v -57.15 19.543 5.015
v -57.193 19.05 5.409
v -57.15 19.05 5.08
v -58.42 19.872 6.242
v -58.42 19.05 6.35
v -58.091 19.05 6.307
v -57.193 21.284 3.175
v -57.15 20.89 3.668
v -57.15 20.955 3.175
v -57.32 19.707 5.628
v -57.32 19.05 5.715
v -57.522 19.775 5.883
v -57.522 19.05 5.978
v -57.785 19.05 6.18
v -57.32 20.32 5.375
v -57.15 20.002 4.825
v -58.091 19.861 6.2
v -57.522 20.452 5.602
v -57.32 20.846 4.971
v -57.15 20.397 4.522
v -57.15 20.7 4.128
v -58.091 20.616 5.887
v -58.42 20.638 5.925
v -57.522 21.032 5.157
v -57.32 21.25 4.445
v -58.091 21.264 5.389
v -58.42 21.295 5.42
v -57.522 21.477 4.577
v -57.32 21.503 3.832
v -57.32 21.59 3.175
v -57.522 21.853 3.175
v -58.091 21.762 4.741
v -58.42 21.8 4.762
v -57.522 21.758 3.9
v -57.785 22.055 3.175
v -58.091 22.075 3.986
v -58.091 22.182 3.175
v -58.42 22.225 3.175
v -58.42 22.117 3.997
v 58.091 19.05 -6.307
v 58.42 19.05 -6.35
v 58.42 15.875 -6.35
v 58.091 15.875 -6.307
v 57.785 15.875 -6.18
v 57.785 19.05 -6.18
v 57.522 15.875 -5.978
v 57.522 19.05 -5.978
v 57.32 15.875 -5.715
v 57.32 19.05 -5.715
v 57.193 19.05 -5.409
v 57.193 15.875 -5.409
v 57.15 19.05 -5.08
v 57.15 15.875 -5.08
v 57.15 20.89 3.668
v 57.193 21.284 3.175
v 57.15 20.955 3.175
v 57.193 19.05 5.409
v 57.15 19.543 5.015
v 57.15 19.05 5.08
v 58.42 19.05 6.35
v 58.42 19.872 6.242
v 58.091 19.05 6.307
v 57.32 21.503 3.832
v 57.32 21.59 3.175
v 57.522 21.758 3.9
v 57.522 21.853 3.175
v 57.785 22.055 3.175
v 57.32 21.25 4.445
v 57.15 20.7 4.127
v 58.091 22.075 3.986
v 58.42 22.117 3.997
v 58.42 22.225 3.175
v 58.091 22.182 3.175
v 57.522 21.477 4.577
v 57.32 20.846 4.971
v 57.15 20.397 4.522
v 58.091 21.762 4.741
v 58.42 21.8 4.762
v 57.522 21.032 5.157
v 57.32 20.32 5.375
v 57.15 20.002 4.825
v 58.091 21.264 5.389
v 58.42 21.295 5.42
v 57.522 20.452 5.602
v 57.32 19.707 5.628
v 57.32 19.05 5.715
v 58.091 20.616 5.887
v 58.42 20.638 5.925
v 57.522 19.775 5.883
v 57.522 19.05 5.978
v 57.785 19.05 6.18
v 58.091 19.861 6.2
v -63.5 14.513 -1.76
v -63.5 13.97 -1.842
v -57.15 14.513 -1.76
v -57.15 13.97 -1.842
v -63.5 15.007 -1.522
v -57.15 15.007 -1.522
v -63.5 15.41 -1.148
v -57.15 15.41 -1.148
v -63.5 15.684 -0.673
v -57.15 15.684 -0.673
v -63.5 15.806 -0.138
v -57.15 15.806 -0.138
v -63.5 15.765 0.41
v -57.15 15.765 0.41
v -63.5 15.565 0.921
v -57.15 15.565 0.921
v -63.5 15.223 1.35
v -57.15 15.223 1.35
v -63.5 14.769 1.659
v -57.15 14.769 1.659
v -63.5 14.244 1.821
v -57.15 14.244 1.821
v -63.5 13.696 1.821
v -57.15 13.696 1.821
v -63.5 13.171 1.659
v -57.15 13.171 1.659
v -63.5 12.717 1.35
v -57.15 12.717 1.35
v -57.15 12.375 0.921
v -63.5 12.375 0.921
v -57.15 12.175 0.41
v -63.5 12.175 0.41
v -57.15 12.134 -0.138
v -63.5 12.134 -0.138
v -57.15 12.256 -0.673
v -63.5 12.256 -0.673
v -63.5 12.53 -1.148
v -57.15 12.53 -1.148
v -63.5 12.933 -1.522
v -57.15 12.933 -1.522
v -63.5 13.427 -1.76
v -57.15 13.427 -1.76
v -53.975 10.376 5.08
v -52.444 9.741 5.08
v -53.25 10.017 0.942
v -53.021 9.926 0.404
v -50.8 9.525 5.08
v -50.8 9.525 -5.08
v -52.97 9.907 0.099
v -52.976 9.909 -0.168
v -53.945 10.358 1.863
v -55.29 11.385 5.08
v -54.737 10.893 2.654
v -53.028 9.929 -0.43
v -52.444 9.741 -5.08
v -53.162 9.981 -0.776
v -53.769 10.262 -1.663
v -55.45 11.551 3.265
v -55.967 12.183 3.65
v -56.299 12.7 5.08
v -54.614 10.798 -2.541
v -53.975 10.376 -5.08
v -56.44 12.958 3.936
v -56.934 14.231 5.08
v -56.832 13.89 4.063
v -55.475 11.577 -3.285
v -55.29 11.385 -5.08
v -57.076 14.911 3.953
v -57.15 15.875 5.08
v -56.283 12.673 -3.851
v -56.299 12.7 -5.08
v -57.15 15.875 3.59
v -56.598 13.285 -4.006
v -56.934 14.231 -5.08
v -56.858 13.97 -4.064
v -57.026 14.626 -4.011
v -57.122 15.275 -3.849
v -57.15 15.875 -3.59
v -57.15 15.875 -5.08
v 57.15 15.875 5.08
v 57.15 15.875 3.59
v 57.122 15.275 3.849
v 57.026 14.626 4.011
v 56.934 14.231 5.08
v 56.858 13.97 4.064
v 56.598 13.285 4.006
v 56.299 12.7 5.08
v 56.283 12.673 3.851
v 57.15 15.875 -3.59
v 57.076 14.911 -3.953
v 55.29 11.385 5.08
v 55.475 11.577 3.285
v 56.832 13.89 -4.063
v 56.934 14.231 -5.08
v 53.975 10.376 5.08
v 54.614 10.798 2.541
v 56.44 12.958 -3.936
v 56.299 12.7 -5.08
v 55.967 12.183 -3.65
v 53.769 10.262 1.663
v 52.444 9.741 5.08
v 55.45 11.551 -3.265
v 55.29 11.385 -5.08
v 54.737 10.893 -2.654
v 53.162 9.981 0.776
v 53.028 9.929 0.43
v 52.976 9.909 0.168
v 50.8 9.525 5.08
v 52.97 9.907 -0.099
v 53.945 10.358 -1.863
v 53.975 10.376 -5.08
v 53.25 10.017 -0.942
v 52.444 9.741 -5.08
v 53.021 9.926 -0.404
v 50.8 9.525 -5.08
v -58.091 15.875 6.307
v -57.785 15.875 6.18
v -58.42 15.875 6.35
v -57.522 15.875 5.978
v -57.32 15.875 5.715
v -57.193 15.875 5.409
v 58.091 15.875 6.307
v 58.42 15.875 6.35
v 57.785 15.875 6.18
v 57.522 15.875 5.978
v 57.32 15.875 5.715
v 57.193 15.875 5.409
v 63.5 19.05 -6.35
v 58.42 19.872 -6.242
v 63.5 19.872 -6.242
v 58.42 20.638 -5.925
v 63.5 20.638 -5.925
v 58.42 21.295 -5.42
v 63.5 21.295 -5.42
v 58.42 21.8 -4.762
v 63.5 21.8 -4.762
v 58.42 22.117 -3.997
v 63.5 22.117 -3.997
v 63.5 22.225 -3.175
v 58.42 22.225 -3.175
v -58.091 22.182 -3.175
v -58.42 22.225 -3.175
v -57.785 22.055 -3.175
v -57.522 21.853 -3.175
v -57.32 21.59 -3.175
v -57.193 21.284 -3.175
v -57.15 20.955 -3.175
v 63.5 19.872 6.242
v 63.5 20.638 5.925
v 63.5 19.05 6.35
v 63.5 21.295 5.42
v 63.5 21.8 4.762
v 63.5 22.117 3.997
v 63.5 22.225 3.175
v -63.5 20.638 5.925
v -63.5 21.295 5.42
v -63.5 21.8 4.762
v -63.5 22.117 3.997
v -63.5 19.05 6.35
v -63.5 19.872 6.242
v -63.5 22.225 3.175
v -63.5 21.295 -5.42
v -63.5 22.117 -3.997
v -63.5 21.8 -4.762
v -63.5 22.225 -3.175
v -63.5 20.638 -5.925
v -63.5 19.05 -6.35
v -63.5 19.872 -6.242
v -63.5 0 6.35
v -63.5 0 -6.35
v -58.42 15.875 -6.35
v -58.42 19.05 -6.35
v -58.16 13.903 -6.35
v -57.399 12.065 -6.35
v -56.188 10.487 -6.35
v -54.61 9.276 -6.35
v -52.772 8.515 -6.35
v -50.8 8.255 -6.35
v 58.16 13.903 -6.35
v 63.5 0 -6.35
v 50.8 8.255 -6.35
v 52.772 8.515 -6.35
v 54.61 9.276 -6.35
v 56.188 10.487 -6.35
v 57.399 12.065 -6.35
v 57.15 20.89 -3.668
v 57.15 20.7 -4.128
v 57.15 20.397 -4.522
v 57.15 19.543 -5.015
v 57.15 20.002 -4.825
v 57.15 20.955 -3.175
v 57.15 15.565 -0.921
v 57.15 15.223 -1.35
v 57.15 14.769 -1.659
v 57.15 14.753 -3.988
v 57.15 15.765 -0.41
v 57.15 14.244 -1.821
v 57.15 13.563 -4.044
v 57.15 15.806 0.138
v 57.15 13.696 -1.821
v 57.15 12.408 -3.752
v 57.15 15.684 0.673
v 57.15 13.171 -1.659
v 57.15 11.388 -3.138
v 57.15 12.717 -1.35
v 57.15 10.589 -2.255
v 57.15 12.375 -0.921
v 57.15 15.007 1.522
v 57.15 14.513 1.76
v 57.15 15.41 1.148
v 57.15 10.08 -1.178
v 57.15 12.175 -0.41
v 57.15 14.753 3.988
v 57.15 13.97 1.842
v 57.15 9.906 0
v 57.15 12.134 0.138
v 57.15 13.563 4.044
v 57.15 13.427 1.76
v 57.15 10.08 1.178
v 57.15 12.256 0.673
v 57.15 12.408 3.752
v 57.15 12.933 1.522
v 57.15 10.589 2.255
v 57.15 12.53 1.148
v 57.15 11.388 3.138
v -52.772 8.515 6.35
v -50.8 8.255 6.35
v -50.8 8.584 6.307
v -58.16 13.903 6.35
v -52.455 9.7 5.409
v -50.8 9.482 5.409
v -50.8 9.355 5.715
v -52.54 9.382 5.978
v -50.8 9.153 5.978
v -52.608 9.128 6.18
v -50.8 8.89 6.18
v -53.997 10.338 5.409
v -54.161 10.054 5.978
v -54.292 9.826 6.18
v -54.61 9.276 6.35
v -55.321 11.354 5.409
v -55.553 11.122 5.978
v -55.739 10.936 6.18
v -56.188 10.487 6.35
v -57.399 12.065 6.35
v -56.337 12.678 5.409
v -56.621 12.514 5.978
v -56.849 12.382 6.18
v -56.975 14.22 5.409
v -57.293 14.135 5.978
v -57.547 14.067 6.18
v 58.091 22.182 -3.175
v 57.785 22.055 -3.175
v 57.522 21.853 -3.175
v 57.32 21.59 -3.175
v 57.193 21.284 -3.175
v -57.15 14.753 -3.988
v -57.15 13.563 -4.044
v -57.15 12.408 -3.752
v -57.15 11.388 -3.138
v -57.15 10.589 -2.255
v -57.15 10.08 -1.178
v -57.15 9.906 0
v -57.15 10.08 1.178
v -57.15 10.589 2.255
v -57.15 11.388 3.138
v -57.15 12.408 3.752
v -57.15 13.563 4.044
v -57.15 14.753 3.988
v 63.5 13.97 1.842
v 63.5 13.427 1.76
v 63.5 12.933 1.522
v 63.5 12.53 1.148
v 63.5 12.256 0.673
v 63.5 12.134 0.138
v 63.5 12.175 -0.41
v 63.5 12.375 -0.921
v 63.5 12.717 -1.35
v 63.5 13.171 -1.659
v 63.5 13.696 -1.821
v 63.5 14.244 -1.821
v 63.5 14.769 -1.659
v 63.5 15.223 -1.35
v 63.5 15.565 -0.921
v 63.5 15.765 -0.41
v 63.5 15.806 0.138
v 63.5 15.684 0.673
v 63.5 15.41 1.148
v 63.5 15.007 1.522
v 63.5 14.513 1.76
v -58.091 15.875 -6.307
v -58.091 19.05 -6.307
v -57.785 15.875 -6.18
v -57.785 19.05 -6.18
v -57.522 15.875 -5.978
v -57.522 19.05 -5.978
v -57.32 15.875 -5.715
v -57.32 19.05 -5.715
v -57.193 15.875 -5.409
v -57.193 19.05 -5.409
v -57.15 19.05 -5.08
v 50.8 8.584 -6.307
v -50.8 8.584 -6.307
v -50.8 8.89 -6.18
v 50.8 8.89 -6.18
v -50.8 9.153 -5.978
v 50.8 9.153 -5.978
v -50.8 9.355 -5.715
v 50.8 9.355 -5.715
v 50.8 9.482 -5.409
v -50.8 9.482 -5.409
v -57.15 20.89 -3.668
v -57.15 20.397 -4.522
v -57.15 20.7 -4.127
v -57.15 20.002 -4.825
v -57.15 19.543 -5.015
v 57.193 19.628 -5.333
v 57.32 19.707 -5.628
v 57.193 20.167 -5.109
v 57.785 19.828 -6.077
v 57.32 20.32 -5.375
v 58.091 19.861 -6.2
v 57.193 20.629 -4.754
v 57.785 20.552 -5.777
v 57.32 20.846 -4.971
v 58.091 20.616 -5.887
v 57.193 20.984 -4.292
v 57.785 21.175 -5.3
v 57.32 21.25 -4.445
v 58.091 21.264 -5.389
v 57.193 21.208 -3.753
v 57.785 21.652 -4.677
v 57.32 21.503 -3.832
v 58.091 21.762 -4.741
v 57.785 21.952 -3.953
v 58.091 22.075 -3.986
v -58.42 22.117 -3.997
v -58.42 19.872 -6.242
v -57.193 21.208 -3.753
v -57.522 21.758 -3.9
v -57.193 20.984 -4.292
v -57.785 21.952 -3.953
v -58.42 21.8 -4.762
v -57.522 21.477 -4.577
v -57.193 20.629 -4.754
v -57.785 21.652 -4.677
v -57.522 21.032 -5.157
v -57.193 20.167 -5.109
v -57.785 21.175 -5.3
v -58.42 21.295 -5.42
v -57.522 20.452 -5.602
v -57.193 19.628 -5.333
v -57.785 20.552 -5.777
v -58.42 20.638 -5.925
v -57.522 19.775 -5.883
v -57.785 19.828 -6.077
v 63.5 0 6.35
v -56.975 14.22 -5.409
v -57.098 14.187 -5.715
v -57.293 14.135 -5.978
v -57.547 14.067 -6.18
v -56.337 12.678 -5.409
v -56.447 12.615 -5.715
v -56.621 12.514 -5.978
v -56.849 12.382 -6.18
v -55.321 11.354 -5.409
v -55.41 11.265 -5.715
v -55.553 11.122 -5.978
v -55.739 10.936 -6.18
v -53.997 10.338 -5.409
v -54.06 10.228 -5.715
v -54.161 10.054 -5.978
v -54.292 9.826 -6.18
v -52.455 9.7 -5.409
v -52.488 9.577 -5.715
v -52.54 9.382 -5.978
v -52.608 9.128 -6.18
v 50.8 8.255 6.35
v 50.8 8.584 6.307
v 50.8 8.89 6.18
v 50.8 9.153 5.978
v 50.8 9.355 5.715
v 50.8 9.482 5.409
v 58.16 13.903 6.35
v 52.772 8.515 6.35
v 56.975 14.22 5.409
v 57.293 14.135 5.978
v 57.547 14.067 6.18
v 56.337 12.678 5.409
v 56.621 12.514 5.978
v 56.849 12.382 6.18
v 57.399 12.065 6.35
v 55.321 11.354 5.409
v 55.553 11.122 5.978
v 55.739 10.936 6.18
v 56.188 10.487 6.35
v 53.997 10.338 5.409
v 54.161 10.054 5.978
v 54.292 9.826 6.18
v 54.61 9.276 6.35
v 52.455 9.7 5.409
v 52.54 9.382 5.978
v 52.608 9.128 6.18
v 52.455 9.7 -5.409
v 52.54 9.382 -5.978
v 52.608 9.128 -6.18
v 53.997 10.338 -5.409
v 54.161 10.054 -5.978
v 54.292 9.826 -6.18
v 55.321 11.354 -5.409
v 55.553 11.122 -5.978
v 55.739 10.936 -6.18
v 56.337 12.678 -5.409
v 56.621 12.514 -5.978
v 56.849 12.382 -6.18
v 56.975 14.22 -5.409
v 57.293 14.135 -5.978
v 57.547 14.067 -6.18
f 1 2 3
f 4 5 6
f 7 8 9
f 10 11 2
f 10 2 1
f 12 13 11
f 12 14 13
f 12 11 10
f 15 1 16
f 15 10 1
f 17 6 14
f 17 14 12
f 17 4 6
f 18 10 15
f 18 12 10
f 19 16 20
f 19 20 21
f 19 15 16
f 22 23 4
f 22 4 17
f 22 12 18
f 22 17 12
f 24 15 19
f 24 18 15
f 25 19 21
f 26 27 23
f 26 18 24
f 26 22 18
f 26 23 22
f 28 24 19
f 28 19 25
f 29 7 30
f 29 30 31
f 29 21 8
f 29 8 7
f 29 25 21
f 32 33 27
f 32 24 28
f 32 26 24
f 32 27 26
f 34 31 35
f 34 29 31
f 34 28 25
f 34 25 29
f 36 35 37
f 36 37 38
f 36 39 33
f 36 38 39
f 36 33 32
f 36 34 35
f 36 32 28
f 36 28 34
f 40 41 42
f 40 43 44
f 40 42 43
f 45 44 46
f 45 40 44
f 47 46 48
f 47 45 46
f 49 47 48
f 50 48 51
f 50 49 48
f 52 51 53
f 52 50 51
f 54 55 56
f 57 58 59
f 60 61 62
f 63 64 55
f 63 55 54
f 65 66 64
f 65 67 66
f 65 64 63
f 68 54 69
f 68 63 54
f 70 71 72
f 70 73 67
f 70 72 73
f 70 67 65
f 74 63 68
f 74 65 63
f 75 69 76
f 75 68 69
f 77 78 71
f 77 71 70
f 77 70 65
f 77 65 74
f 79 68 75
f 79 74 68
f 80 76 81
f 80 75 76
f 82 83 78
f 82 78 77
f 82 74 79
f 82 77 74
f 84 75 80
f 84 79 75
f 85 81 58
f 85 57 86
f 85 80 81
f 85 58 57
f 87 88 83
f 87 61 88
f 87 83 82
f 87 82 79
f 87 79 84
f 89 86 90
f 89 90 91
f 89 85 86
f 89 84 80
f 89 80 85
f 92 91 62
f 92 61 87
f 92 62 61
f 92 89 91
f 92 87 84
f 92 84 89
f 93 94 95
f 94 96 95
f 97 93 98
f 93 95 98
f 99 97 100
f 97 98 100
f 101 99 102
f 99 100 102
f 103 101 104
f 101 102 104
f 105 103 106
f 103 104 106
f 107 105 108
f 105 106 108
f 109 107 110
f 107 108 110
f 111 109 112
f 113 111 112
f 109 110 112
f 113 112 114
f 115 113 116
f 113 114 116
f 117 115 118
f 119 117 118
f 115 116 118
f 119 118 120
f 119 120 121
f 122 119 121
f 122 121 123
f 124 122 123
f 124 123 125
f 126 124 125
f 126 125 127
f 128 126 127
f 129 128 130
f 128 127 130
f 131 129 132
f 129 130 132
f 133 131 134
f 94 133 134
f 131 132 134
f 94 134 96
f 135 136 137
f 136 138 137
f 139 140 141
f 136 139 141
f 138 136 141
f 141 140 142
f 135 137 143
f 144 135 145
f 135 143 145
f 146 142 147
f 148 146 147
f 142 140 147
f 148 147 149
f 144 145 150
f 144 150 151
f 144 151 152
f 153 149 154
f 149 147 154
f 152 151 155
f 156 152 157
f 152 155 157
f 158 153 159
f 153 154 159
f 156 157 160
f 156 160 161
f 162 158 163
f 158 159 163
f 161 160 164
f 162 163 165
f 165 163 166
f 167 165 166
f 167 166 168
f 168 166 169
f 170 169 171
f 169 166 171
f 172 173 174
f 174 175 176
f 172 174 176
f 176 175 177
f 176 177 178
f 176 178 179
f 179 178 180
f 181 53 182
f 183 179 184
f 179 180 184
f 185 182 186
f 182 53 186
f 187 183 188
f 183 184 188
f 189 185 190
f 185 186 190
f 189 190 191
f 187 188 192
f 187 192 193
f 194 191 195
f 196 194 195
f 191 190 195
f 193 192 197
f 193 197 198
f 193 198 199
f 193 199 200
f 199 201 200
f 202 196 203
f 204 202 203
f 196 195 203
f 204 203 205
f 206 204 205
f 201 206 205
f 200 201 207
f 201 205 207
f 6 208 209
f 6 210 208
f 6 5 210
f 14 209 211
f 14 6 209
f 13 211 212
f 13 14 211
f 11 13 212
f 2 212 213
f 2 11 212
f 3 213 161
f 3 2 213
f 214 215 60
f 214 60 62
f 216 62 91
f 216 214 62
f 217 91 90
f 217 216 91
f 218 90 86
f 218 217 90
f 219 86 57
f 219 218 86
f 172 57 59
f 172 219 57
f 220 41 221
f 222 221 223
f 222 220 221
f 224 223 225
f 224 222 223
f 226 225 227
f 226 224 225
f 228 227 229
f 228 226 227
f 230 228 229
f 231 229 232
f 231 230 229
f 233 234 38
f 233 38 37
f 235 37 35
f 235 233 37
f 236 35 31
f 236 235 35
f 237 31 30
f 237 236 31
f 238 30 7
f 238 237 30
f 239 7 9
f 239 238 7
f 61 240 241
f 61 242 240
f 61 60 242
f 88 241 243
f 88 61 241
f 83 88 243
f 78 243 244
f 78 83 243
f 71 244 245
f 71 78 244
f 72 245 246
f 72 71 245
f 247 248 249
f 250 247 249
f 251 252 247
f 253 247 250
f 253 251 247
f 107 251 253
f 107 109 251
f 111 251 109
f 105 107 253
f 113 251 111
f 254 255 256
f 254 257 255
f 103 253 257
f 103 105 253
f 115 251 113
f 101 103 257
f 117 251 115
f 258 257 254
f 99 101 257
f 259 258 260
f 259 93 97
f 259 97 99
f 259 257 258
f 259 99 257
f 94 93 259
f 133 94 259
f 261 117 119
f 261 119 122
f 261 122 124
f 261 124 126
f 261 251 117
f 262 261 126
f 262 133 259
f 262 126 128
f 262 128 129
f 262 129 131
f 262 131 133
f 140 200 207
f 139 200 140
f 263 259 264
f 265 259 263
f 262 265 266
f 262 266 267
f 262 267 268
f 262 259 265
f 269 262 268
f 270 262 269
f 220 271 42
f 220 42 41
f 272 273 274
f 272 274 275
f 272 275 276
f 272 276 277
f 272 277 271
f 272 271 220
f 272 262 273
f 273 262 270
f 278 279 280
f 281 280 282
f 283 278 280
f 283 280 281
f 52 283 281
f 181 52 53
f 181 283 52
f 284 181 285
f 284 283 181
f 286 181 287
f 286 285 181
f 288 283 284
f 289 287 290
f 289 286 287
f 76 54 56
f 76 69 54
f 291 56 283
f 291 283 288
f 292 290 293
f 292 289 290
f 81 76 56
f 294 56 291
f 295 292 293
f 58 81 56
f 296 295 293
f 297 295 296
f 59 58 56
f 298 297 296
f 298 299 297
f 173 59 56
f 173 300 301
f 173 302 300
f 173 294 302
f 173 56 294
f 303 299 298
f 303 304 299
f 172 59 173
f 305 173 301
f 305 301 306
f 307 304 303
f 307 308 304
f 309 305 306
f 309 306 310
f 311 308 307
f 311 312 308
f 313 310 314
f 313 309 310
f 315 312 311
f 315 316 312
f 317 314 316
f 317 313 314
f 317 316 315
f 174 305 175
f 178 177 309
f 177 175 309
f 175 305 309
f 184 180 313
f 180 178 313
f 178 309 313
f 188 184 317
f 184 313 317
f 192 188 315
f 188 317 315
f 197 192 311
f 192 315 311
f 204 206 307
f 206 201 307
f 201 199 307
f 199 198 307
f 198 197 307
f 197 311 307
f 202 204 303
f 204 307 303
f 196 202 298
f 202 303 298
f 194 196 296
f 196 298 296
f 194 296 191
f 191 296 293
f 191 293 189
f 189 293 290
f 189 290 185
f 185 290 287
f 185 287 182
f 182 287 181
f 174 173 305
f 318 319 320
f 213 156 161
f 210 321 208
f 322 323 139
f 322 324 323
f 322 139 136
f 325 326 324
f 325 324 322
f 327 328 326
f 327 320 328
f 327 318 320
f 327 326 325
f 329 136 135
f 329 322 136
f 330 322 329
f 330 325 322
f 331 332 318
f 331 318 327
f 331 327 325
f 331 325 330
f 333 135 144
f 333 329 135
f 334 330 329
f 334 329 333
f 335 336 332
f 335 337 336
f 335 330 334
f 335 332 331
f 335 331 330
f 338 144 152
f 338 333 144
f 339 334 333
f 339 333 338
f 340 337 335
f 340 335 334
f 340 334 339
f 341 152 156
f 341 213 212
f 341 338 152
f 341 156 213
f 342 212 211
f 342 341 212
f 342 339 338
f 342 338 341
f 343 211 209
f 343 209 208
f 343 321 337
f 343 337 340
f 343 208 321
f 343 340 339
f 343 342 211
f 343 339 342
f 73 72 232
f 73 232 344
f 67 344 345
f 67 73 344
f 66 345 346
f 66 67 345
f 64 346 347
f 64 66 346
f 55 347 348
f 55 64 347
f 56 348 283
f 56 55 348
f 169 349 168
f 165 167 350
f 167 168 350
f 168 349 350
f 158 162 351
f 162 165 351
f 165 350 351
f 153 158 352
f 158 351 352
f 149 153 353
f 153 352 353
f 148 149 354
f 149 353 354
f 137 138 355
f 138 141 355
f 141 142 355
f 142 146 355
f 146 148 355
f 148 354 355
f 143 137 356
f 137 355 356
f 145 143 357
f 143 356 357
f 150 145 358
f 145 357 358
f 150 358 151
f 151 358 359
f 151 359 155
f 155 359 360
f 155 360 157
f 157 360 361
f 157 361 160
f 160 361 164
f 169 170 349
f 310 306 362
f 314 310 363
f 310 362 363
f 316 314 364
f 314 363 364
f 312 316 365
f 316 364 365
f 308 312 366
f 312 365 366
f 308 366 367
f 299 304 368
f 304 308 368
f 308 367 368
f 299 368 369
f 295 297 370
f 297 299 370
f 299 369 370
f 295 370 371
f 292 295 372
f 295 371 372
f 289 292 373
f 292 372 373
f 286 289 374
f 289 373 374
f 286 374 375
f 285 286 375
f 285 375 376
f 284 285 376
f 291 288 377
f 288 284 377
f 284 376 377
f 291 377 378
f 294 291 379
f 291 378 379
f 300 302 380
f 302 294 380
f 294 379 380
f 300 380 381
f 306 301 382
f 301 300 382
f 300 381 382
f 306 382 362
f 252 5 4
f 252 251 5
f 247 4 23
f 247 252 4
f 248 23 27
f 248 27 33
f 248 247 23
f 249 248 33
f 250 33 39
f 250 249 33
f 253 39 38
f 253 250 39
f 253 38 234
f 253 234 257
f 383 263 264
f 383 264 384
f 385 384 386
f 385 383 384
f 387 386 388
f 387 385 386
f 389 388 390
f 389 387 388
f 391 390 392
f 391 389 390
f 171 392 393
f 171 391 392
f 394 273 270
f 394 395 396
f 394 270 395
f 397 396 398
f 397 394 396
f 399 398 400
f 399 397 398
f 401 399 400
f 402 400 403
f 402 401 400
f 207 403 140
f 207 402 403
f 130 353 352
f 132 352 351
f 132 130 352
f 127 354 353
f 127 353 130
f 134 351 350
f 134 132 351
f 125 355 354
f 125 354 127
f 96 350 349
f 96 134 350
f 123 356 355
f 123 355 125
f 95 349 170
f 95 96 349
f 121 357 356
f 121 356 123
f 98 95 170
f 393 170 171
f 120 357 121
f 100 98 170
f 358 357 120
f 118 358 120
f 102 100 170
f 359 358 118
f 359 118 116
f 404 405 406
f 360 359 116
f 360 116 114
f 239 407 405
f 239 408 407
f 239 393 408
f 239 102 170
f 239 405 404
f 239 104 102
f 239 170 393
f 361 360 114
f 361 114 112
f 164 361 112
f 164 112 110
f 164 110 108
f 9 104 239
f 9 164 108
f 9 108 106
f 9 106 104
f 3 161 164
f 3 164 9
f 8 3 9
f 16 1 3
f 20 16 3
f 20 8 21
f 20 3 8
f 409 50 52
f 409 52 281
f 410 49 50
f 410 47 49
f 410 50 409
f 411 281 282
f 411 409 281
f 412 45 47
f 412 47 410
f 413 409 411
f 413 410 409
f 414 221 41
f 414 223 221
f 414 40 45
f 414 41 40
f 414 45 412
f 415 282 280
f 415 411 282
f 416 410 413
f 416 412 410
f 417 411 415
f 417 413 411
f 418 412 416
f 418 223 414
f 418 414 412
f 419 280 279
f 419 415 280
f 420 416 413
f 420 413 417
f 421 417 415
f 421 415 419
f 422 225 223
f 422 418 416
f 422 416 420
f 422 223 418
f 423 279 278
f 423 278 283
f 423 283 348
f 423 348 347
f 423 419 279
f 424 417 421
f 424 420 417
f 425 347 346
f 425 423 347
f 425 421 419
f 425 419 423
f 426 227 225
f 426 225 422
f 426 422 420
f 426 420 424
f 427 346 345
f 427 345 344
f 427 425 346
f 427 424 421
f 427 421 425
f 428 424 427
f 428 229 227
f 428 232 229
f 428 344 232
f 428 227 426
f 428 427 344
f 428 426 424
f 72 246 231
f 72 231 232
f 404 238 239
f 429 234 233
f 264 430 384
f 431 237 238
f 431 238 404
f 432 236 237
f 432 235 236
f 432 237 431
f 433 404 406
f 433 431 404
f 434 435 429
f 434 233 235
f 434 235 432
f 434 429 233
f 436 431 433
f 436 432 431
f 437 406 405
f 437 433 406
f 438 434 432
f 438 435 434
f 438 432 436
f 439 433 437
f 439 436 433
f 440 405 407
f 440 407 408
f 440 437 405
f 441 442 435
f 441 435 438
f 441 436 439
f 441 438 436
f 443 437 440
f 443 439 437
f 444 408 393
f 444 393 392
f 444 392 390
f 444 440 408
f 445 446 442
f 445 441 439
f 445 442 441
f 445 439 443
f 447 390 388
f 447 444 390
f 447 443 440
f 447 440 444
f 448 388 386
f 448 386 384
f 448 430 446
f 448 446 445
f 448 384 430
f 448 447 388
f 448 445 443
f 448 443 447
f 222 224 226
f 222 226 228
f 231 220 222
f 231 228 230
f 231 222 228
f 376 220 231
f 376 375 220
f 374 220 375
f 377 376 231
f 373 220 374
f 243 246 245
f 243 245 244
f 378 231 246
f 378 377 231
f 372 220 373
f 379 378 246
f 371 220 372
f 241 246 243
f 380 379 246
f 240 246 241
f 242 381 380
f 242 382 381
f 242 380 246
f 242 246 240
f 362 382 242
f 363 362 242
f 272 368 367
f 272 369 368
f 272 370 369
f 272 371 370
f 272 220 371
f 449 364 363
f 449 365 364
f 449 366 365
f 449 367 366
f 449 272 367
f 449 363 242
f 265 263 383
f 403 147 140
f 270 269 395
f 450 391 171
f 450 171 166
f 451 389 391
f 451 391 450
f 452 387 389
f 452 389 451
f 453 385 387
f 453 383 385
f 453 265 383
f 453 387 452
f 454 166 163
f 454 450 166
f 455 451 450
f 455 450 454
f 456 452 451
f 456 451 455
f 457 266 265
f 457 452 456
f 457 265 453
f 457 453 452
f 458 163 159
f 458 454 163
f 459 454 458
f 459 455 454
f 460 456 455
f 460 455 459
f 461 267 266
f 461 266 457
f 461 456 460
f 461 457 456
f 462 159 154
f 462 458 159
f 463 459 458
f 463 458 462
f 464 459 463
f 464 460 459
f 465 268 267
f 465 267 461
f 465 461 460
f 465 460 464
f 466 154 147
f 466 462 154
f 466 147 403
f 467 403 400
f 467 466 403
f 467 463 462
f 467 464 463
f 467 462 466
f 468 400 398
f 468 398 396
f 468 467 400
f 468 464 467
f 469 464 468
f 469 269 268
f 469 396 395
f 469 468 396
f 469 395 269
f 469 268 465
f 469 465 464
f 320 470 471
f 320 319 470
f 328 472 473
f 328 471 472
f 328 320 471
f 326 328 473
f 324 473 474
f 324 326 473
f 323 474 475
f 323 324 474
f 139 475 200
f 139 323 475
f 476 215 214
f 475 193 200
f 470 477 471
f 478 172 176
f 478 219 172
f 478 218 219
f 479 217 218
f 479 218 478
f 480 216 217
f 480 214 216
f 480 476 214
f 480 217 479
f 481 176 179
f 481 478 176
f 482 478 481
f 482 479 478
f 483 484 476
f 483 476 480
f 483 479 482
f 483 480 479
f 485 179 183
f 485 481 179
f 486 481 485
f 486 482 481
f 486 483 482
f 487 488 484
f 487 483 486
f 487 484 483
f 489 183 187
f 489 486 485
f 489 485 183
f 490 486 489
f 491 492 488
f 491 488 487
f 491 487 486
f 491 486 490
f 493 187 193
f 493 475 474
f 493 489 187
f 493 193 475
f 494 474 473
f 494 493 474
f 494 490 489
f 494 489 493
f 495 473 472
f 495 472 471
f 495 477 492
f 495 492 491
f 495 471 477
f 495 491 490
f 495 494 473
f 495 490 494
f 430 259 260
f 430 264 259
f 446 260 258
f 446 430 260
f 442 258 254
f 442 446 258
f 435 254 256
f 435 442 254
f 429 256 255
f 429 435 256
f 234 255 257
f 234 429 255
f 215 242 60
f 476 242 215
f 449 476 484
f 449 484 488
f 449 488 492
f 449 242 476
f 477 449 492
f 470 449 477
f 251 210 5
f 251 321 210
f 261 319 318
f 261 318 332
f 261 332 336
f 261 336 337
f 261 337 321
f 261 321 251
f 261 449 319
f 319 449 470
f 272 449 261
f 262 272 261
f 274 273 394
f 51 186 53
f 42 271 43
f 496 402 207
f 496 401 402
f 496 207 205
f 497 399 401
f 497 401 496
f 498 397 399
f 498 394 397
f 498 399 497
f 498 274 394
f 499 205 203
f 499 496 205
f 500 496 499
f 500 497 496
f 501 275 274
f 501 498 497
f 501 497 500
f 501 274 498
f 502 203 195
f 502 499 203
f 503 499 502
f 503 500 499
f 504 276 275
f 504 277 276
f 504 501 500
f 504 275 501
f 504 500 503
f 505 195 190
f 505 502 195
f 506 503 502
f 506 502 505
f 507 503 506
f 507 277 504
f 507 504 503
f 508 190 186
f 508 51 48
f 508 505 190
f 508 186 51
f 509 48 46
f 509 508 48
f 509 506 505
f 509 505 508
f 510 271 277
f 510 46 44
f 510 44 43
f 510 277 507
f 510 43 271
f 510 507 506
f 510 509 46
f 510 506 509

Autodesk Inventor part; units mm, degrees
ref_plane "YZ Plane" through (0, 0, 0) normal (1, 0, 0) x (0, 1, 0)
ref_plane "XZ Plane" through (0, 0, 0) normal (0, 1, 0) x (-1, 0, 0)
ref_plane "XY Plane" through (0, 0, 0) normal (0, 0, 1) x (1, 0, 0)
sketch "Sketch1" plane through (0, 0, 0) normal (0, 1, 0) x (-1, 0, 0)
  line L0 (63.5, -6.35) -> (-63.5, -6.35)
  line L1 (-63.5, -6.35) -> (-63.5, 6.35)
  line L2 (-63.5, 6.35) -> (63.5, 6.35)
  line L3 (63.5, 6.35) -> (63.5, -6.35)
  line L4 (63.5, -6.35) -> (-63.5, 6.35) construction
  line L5 (-63.5, -6.35) -> (63.5, 6.35) construction
  point P0 (0, 0)
  dimension "d0" = 12.7
  dimension "d1" = 127
extrude "Extrusion1" add sketch "Sketch1" along normal blind 22.225
sketch "Sketch2" plane through (-63.5, 0, 6.35) normal (0, 0, 1) x (1, 0, 0)
  line L0 (127, 0) -> (0, 0) projected
  line L1 (127, 0) -> (127, 22.225) projected
  line L2 (0, 22.225) -> (127, 22.225) projected
  line L3 (0, 0) -> (0, 22.225) projected
  line L4 (6.35, 22.225) -> (120.65, 22.225)
  line L5 (120.65, 22.225) -> (120.65, 9.525)
  line L6 (120.65, 9.525) -> (6.35, 9.525)
  line L7 (6.35, 9.525) -> (6.35, 22.225)
  point P0 (63.5, 0)
  dimension "d4" = 6.35
  dimension "d5" = 6.35
  dimension "d6" = 9.525
extrude "Extrusion2" cut sketch "Sketch2" against normal blind 22.225 contours L5 L6 L7 L2
fillet "Fillet1" radius 6.35 2 edges at (57.15, 9.525, 0) (-57.15, 9.525, 0)
sketch "Sketch3" plane through (-57.15, 22.225, 6.35) normal (1, 0, 0) x (0, 0, -1)
  line L0 (0, 0) -> (12.7, 0) projected
  point P0 (6.35, -22.225)
  point P1 (6.35, -8.255)
  dimension "d10" = 8.255
hole "Hole1" at (-57.15, 13.97, 0) direction (-1, 0, 0) diameter 3.683 end through all
sketch "Sketch4" plane through (-63.5, 0, -6.35) normal (-1, 0, 0) x (0, 0, 1)
  circle A0 centre (6.35, 13.97) radius 1.8415 projected
  point P0 (6.35, 0)
hole "Hole2" at (-63.5, 13.97, 0) direction (1, 0, 0) diameter 3.683 end through all
sketch "Sketch5" plane through (57.15, 22.225, -6.35) normal (-1, 0, 0) x (0, 0, 1)
  circle A0 centre (6.35, -8.255) radius 1.8415 projected
  circle A1 centre (6.35, -8.255) radius 4.064
  point P0 (6.35, -22.225)
  dimension "d25" = 8.128
extrude "Extrusion3" cut sketch "Sketch5" along normal blind 22.225
fillet "Fillet2" radius 3.175 4 edges at (60.325, 22.225, 6.35) (60.325, 22.225, -6.35) (-60.325, 22.225, 6.35) (-60.325, 22.225, -6.35)
sketch "Sketch6" plane through (-57.15, 15.875, 6.35) normal (1, 0, 0) x (0, 0, -1)
  circle A0 centre (6.35, -1.905) radius 1.8415 projected
  circle A1 centre (6.35, -1.905) radius 4.064
  point P0 (6.35, -15.875)
  dimension "d29" = 8.128
extrude "Extrusion4" cut sketch "Sketch6" along normal blind 22.225
fillet "Fillet3" radius 1.27 16 edges at (-55.2901, 11.3849, 6.35) (-57.15, 17.4625, 6.35) (-57.15, 21.2951, 5.4201) (-57.15, 22.225, 0) (-57.15, 21.2951, -5.4201) (-57.15, 17.4625, -6.35) (-55.2901, 11.3849, -6.35) (0, 9.525, -6.35) (55.2901, 11.3849, -6.35) (57.15, 17.4625, -6.35) (57.15, 21.2951, -5.4201) (57.15, 22.225, 0) (57.15, 21.2951, 5.4201) (57.15, 17.4625, 6.35) (55.2901, 11.3849, 6.35) (0, 9.525, 6.35)
properties part number "SwarmieLidSupport"
